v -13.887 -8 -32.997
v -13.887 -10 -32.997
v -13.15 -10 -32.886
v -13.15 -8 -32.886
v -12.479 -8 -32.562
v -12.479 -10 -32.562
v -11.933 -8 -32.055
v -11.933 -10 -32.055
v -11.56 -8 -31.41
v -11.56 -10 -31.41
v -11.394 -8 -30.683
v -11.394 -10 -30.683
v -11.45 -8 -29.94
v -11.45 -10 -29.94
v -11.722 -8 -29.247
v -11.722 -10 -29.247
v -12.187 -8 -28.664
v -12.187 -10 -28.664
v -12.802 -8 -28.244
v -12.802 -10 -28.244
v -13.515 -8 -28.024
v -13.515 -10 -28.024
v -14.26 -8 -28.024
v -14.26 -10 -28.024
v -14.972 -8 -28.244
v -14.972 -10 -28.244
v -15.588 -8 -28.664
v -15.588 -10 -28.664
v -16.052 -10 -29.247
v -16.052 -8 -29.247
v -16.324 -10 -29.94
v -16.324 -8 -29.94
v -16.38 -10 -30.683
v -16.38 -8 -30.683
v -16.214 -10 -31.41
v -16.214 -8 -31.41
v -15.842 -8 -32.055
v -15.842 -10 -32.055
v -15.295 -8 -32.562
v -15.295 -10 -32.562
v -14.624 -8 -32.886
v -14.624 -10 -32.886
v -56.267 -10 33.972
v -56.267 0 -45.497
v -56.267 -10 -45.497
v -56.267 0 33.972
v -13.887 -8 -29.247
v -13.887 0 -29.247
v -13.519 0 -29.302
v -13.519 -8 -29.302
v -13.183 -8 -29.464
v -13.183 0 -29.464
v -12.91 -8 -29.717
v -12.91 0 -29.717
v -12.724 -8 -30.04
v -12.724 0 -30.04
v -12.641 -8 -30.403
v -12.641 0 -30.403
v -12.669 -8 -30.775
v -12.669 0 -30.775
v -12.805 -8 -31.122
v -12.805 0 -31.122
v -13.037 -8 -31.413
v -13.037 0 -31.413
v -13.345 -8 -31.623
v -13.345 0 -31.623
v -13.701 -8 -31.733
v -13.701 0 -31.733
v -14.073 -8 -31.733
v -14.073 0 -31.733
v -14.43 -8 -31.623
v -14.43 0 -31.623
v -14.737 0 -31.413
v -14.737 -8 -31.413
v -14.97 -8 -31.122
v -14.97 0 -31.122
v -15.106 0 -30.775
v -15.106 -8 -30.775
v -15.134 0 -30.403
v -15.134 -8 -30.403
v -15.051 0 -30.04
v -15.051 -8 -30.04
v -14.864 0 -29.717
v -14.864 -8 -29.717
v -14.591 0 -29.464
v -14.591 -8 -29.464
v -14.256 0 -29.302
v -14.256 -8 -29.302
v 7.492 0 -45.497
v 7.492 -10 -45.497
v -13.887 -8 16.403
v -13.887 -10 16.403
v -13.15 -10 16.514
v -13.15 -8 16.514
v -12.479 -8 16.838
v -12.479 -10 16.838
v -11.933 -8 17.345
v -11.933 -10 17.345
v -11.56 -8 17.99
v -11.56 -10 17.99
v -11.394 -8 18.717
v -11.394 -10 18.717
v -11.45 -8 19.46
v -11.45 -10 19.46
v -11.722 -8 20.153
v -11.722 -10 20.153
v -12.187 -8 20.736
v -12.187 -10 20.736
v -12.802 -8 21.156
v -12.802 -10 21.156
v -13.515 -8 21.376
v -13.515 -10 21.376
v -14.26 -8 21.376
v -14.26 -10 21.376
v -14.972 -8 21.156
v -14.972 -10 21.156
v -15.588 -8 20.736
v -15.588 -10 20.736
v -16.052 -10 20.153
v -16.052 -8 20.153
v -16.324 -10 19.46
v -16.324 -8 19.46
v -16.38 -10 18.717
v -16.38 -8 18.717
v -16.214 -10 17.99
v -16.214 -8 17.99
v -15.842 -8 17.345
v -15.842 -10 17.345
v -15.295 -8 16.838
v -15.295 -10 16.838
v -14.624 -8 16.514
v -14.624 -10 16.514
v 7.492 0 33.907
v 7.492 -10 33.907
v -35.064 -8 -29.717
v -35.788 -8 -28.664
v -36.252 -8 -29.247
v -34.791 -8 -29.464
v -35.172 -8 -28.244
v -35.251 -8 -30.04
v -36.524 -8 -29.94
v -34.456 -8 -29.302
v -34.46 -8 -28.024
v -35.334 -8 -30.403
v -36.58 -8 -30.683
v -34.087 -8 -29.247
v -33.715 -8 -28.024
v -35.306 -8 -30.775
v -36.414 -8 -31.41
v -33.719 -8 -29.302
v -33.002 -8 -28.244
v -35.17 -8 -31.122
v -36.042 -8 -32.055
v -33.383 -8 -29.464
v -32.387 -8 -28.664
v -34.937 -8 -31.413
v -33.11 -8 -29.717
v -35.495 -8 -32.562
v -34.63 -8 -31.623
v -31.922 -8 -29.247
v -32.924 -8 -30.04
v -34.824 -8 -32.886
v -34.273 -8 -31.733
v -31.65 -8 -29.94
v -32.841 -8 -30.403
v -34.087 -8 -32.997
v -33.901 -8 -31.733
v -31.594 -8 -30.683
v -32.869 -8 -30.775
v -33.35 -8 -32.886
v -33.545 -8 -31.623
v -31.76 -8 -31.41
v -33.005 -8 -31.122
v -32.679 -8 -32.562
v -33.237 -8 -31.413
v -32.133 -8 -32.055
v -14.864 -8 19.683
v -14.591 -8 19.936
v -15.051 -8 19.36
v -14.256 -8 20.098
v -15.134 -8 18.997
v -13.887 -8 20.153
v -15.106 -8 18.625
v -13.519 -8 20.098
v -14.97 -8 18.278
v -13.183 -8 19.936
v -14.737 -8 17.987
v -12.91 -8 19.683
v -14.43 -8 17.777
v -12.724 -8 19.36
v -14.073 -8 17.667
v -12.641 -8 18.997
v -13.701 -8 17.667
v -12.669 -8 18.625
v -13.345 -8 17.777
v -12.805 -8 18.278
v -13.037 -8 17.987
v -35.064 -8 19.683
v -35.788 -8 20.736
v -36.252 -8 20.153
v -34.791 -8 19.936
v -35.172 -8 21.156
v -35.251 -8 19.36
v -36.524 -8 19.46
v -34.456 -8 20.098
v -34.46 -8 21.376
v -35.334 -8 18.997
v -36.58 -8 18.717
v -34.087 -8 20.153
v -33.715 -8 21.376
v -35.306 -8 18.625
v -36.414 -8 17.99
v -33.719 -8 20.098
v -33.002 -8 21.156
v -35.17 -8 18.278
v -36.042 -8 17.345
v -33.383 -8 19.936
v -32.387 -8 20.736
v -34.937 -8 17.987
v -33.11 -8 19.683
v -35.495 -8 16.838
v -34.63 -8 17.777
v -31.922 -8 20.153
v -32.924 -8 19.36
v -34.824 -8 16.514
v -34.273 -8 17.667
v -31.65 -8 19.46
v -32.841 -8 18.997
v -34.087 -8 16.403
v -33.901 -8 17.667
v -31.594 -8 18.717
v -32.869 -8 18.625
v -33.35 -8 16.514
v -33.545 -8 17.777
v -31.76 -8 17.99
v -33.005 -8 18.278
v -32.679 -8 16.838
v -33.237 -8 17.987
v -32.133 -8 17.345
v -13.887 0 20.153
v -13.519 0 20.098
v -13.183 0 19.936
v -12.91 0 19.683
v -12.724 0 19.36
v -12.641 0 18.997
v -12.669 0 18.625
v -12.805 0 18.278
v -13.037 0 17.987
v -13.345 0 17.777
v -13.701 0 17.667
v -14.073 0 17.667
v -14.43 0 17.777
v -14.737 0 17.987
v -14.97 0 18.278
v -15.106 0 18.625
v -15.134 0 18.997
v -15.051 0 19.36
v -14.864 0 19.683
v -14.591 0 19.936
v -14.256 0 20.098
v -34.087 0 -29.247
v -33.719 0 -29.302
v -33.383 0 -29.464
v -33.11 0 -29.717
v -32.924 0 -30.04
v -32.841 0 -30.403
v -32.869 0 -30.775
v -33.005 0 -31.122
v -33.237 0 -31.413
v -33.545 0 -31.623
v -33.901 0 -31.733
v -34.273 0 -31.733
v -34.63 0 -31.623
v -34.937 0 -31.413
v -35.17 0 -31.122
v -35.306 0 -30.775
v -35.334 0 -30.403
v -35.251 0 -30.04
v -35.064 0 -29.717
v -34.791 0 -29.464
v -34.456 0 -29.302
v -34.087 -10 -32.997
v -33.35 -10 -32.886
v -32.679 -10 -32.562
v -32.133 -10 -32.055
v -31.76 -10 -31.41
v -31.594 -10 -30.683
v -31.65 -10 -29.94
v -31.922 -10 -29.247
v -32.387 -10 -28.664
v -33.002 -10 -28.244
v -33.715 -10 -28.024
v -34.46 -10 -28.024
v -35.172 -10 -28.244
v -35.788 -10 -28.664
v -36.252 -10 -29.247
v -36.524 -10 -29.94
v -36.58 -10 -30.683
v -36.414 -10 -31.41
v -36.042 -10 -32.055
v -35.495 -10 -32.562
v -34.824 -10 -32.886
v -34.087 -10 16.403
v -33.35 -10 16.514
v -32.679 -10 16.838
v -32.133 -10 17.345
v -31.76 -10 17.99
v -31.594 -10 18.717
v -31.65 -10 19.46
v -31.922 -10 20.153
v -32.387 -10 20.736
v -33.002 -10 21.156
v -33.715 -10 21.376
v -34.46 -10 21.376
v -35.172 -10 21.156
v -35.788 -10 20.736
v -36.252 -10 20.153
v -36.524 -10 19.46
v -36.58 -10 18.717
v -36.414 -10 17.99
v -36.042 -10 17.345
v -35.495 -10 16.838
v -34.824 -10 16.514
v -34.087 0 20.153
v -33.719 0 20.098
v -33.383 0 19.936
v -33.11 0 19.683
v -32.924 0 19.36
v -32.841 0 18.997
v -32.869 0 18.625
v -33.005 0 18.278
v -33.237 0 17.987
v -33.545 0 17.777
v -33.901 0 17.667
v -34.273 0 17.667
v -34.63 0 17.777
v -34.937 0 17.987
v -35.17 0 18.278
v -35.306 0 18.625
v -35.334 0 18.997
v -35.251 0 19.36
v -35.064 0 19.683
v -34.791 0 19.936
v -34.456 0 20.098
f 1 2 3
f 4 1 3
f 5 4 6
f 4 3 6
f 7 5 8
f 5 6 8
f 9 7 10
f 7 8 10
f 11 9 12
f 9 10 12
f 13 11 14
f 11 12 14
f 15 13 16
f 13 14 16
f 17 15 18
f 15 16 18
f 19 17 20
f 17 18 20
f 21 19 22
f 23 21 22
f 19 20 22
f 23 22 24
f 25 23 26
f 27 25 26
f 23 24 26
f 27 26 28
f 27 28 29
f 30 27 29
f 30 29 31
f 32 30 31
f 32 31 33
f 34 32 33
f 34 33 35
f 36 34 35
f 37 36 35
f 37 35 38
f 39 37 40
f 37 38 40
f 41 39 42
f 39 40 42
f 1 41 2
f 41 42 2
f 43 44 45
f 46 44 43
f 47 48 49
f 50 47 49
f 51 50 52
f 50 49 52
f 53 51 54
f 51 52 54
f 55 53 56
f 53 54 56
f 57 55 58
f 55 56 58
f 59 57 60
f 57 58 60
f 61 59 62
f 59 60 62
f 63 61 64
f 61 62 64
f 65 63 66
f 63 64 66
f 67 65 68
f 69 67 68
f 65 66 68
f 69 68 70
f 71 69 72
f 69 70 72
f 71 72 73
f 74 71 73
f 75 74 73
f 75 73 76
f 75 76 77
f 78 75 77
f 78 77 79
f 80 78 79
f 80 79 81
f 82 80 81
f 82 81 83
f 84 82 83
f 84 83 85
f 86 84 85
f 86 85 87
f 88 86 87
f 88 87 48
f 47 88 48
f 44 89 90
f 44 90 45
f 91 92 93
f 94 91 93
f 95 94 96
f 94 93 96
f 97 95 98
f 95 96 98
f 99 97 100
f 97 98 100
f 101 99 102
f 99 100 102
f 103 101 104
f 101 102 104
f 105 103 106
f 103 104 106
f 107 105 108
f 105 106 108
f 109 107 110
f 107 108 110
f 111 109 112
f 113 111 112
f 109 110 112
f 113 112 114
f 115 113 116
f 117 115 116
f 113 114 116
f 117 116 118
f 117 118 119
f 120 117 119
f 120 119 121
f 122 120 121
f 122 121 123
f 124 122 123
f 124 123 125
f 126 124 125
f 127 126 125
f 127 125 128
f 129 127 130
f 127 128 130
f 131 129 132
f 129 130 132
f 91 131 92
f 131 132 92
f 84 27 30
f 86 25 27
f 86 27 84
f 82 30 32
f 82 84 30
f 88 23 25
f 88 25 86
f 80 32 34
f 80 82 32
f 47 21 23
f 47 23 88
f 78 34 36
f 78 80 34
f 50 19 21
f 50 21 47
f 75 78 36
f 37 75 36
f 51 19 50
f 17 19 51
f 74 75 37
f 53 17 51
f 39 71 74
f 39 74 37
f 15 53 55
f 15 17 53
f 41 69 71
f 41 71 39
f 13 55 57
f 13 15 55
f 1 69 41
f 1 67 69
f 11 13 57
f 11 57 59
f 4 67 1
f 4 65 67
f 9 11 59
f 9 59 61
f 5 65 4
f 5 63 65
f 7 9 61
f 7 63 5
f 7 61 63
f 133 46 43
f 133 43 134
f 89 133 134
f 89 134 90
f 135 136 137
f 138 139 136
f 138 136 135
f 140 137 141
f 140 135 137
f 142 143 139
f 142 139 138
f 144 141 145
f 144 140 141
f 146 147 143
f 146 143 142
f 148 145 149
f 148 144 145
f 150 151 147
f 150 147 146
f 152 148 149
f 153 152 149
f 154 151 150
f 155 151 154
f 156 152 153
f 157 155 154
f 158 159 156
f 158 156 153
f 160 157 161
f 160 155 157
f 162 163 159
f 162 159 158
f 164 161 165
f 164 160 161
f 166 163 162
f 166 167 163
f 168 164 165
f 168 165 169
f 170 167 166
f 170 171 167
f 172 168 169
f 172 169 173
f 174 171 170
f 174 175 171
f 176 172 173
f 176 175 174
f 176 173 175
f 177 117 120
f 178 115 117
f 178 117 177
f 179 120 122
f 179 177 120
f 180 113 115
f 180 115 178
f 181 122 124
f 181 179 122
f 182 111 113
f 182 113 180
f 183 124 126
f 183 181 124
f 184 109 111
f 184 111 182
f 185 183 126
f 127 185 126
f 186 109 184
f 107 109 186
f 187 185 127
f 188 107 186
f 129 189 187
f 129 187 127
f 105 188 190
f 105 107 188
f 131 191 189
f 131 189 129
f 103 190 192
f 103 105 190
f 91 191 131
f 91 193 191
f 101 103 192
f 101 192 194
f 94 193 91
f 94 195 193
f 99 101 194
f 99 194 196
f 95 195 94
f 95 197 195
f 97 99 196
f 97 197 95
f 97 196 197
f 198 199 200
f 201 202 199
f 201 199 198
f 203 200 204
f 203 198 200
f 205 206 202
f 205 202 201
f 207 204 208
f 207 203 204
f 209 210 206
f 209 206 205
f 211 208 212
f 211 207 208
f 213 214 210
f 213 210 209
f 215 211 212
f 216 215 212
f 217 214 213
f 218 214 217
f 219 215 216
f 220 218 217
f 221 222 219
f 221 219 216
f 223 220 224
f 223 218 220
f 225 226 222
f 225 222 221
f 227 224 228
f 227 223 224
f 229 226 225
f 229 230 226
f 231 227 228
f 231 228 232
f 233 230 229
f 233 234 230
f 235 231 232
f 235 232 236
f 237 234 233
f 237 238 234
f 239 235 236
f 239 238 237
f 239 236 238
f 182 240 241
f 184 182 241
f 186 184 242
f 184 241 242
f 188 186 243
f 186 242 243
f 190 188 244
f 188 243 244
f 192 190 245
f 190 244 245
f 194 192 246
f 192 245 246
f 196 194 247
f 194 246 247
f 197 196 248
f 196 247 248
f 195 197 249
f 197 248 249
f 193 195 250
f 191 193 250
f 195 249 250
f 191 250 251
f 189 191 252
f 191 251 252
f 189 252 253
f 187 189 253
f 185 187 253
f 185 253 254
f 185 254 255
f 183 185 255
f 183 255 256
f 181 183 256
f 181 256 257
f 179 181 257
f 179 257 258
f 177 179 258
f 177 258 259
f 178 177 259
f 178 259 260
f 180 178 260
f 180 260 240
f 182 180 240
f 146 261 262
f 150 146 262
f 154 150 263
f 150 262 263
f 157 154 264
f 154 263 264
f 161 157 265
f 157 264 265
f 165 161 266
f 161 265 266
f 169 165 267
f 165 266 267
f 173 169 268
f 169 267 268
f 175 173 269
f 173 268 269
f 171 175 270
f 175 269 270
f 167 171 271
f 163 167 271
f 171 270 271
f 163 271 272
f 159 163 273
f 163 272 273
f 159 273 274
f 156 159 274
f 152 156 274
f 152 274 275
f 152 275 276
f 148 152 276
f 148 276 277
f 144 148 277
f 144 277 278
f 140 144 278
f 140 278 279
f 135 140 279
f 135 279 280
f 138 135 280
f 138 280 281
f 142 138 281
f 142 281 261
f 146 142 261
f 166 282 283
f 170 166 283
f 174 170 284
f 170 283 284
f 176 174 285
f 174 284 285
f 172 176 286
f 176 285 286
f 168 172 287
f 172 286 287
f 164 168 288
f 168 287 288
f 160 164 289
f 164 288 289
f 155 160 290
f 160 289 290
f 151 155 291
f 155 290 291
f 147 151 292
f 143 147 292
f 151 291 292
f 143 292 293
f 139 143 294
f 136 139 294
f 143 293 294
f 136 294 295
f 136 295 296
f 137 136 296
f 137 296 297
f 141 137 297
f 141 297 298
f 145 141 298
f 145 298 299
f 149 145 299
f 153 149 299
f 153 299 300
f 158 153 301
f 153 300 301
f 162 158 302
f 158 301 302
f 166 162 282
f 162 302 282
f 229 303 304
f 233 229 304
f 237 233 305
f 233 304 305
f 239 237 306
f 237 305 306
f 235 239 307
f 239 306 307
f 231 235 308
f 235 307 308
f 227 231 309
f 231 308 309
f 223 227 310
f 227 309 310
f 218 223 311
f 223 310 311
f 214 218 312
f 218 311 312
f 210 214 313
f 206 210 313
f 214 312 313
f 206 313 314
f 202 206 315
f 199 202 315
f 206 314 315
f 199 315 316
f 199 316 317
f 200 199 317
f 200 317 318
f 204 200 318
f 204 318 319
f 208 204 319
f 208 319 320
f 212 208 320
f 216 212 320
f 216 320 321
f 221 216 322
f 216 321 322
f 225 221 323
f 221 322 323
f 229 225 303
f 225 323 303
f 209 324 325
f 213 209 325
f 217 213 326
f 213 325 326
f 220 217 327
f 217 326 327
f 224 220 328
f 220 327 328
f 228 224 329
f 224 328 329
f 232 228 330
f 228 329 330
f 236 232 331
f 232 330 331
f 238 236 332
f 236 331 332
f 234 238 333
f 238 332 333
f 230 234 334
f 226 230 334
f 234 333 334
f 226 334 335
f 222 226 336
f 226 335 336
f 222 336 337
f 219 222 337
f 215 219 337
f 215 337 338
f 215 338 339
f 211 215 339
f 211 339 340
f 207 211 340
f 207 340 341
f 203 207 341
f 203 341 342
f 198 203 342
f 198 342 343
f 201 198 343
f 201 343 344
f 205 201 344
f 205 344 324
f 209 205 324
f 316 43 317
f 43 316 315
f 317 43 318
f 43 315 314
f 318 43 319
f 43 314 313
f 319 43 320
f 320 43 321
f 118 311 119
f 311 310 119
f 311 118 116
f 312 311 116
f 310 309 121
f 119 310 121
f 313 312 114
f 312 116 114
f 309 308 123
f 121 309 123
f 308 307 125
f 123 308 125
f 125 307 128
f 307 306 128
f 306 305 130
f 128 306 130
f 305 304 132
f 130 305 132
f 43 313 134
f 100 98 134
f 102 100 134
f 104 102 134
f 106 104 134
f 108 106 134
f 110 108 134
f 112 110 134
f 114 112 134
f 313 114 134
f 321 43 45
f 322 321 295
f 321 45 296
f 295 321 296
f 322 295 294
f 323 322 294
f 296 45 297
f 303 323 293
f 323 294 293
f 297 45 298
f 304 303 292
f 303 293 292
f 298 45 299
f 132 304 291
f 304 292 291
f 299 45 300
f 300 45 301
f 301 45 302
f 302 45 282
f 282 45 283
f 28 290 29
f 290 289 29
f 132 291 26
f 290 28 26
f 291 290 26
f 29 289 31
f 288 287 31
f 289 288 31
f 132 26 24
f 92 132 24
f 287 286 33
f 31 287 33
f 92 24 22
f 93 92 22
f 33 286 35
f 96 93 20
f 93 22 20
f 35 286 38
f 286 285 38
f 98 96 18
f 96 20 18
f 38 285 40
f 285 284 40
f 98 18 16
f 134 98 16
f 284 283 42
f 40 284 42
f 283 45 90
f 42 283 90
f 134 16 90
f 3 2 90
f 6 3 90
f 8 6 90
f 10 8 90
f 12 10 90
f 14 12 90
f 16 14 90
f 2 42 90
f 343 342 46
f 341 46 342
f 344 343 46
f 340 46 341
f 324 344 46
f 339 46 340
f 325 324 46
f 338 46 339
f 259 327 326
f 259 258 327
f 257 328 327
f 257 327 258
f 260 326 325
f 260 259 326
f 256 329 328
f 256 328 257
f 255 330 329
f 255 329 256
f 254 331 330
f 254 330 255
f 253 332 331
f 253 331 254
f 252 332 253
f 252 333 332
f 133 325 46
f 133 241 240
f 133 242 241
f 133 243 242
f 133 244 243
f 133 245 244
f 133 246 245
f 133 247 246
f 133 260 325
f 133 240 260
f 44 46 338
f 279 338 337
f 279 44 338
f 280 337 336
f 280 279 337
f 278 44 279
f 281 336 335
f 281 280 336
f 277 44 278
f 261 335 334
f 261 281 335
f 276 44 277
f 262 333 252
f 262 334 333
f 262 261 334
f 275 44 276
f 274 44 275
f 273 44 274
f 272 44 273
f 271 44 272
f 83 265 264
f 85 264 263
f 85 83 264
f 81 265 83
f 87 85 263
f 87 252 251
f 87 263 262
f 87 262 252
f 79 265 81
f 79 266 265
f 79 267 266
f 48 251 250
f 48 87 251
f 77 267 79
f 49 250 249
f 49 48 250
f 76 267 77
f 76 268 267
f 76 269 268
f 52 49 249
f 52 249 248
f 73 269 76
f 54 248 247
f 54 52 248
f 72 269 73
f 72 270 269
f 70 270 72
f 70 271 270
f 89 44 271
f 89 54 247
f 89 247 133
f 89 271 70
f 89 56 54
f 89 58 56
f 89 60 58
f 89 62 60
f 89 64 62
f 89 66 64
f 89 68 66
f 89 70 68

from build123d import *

# Parameters (mm, degrees)
SKETCH1_R           = 1.25
BOSS_EXTRUDE2_DEPTH = 10
SKETCH3_R           = 2.5
CUT_EXTRUDE2_DEPTH  = 2


with BuildPart() as part:
    # Sketch1 → Boss-Extrude2 (new body)
    with BuildSketch(Plane(origin=(0, 0, 0), x_dir=(1, 0, 0), z_dir=(0, 1, 0))):
        Polygon((7.491574944, 45.496576397), (-56.267168264, 45.496576397), (-56.267168264, -33.972048376), (7.491574944, -33.906823563), align=None)
        with Locations(Location((-34.087168277, -18.903423613, 0), (0, 0, 270))):
            Circle(SKETCH1_R, mode=Mode.SUBTRACT)
        with Locations(Location((-13.887168277, -18.903423613, 0), (0, 0, 270))):
            Circle(SKETCH1_R, mode=Mode.SUBTRACT)
        with Locations(Location((-34.087168277, 30.496576397, 0), (0, 0, 270))):
            Circle(SKETCH1_R, mode=Mode.SUBTRACT)
        with Locations(Location((-13.887168277, 30.496576397, 0), (0, 0, 270))):
            Circle(SKETCH1_R, mode=Mode.SUBTRACT)
    extrude(amount=-BOSS_EXTRUDE2_DEPTH)

    # Sketch3 → Cut-Extrude2 (cut)
    with BuildSketch(Plane.XZ.offset(10)):
        with Locations(Location((-13.887168277, 18.903423613, 0), (0, 0, 270))):
            Circle(SKETCH3_R)
        with Locations(Location((-34.087168277, 18.903423613, 0), (0, 0, 270))):
            Circle(SKETCH3_R)
        with Locations(Location((-13.887168277, -30.496576397, 0), (0, 0, 270))):
            Circle(SKETCH3_R)
        with Locations(Location((-34.087168277, -30.496576397, 0), (0, 0, 270))):
            Circle(SKETCH3_R)
    extrude(amount=-CUT_EXTRUDE2_DEPTH, mode=Mode.SUBTRACT)


solid = part.part
